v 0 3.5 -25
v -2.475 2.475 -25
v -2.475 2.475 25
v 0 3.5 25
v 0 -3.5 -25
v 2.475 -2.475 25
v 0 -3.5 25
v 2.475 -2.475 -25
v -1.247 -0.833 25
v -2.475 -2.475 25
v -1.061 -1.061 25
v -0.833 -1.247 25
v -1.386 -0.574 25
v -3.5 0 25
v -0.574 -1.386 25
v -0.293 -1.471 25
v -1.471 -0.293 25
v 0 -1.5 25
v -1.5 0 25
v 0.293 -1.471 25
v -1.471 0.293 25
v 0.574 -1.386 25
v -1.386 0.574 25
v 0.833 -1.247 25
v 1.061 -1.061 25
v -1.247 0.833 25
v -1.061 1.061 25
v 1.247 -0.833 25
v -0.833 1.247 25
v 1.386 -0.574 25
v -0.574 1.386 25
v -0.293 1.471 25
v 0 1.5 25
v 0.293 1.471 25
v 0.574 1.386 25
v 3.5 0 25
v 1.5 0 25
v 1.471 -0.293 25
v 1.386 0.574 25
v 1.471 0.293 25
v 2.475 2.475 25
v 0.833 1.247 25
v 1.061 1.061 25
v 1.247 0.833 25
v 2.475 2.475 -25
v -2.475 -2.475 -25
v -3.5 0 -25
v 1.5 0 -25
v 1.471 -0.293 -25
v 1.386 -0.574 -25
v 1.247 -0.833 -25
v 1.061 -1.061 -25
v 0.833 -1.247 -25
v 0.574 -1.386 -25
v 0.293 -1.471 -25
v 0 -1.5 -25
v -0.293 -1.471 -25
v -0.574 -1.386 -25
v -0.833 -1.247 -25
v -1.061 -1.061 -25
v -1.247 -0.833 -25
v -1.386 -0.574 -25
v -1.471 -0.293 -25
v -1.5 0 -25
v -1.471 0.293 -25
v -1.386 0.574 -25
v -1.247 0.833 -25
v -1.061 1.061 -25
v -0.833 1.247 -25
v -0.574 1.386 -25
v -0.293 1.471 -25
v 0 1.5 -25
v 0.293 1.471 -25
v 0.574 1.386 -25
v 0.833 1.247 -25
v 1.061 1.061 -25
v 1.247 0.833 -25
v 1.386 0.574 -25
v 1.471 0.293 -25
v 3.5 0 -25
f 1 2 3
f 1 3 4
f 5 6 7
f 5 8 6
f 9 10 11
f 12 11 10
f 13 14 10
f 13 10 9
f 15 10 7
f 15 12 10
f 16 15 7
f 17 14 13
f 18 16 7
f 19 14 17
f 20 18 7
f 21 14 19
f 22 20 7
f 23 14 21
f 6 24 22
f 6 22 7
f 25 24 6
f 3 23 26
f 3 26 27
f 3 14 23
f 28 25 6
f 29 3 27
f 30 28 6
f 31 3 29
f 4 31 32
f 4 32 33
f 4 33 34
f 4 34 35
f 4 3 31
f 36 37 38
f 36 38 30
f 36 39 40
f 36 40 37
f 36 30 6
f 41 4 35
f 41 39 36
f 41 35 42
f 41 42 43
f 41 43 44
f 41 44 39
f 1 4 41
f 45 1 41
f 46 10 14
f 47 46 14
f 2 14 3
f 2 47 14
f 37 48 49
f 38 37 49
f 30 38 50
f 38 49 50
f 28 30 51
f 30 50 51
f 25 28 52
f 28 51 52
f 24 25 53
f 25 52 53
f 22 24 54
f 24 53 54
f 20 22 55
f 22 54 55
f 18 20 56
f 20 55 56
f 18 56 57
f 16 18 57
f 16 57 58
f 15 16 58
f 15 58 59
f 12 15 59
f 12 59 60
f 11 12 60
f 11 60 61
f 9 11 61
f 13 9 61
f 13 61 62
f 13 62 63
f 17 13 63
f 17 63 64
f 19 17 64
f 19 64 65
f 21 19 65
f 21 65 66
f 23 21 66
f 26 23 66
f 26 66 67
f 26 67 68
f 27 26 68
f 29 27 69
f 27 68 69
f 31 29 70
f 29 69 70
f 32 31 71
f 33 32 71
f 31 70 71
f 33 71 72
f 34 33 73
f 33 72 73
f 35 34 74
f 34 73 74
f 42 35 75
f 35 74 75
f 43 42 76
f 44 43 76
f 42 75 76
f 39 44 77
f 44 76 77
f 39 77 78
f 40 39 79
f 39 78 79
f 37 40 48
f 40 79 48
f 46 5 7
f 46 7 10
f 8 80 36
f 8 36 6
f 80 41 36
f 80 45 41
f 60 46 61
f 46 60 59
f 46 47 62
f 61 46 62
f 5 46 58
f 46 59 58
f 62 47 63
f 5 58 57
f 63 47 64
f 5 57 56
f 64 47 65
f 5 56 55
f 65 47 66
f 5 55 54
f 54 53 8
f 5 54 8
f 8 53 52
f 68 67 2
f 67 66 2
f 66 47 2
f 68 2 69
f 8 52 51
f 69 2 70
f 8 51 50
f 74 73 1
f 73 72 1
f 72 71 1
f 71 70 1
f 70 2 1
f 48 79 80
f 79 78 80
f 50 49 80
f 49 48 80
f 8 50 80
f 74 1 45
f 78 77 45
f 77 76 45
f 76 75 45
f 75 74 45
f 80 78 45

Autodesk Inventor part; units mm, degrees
sketch "Skizze1" plane through (0, 0, 0) normal (0, 0, 1) x (1, 0, 0)
  line L0 (0, 4.9) -> (0, -4.9)
  line L1 (-4.9, 0) -> (4.9, 0)
  line L2 (0, 3.5) -> (2.4749, 2.4749)
  line L3 (2.4749, 2.4749) -> (3.5, 0)
  line L4 (3.5, 0) -> (2.4749, -2.4749)
  line L5 (2.4749, -2.4749) -> (0, -3.5)
  line L6 (0, -3.5) -> (-2.4749, -2.4749)
  line L7 (-2.4749, -2.4749) -> (-3.5, 0)
  line L8 (-3.5, 0) -> (-2.4749, 2.4749)
  line L9 (-2.4749, 2.4749) -> (0, 3.5)
  circle A0 centre (0, 0) radius 1.5
  dimension "d0" = 3
extrude "Extrusion1" add sketch "Skizze1" along normal mid plane 50 contours L2 L3 L1 A0 L0 | L0 A0 L1 L8 L9 | L1 L4 L5 L0 A0 | A0 L0 L6 L7 L1
properties part number "StutzeHinten"
